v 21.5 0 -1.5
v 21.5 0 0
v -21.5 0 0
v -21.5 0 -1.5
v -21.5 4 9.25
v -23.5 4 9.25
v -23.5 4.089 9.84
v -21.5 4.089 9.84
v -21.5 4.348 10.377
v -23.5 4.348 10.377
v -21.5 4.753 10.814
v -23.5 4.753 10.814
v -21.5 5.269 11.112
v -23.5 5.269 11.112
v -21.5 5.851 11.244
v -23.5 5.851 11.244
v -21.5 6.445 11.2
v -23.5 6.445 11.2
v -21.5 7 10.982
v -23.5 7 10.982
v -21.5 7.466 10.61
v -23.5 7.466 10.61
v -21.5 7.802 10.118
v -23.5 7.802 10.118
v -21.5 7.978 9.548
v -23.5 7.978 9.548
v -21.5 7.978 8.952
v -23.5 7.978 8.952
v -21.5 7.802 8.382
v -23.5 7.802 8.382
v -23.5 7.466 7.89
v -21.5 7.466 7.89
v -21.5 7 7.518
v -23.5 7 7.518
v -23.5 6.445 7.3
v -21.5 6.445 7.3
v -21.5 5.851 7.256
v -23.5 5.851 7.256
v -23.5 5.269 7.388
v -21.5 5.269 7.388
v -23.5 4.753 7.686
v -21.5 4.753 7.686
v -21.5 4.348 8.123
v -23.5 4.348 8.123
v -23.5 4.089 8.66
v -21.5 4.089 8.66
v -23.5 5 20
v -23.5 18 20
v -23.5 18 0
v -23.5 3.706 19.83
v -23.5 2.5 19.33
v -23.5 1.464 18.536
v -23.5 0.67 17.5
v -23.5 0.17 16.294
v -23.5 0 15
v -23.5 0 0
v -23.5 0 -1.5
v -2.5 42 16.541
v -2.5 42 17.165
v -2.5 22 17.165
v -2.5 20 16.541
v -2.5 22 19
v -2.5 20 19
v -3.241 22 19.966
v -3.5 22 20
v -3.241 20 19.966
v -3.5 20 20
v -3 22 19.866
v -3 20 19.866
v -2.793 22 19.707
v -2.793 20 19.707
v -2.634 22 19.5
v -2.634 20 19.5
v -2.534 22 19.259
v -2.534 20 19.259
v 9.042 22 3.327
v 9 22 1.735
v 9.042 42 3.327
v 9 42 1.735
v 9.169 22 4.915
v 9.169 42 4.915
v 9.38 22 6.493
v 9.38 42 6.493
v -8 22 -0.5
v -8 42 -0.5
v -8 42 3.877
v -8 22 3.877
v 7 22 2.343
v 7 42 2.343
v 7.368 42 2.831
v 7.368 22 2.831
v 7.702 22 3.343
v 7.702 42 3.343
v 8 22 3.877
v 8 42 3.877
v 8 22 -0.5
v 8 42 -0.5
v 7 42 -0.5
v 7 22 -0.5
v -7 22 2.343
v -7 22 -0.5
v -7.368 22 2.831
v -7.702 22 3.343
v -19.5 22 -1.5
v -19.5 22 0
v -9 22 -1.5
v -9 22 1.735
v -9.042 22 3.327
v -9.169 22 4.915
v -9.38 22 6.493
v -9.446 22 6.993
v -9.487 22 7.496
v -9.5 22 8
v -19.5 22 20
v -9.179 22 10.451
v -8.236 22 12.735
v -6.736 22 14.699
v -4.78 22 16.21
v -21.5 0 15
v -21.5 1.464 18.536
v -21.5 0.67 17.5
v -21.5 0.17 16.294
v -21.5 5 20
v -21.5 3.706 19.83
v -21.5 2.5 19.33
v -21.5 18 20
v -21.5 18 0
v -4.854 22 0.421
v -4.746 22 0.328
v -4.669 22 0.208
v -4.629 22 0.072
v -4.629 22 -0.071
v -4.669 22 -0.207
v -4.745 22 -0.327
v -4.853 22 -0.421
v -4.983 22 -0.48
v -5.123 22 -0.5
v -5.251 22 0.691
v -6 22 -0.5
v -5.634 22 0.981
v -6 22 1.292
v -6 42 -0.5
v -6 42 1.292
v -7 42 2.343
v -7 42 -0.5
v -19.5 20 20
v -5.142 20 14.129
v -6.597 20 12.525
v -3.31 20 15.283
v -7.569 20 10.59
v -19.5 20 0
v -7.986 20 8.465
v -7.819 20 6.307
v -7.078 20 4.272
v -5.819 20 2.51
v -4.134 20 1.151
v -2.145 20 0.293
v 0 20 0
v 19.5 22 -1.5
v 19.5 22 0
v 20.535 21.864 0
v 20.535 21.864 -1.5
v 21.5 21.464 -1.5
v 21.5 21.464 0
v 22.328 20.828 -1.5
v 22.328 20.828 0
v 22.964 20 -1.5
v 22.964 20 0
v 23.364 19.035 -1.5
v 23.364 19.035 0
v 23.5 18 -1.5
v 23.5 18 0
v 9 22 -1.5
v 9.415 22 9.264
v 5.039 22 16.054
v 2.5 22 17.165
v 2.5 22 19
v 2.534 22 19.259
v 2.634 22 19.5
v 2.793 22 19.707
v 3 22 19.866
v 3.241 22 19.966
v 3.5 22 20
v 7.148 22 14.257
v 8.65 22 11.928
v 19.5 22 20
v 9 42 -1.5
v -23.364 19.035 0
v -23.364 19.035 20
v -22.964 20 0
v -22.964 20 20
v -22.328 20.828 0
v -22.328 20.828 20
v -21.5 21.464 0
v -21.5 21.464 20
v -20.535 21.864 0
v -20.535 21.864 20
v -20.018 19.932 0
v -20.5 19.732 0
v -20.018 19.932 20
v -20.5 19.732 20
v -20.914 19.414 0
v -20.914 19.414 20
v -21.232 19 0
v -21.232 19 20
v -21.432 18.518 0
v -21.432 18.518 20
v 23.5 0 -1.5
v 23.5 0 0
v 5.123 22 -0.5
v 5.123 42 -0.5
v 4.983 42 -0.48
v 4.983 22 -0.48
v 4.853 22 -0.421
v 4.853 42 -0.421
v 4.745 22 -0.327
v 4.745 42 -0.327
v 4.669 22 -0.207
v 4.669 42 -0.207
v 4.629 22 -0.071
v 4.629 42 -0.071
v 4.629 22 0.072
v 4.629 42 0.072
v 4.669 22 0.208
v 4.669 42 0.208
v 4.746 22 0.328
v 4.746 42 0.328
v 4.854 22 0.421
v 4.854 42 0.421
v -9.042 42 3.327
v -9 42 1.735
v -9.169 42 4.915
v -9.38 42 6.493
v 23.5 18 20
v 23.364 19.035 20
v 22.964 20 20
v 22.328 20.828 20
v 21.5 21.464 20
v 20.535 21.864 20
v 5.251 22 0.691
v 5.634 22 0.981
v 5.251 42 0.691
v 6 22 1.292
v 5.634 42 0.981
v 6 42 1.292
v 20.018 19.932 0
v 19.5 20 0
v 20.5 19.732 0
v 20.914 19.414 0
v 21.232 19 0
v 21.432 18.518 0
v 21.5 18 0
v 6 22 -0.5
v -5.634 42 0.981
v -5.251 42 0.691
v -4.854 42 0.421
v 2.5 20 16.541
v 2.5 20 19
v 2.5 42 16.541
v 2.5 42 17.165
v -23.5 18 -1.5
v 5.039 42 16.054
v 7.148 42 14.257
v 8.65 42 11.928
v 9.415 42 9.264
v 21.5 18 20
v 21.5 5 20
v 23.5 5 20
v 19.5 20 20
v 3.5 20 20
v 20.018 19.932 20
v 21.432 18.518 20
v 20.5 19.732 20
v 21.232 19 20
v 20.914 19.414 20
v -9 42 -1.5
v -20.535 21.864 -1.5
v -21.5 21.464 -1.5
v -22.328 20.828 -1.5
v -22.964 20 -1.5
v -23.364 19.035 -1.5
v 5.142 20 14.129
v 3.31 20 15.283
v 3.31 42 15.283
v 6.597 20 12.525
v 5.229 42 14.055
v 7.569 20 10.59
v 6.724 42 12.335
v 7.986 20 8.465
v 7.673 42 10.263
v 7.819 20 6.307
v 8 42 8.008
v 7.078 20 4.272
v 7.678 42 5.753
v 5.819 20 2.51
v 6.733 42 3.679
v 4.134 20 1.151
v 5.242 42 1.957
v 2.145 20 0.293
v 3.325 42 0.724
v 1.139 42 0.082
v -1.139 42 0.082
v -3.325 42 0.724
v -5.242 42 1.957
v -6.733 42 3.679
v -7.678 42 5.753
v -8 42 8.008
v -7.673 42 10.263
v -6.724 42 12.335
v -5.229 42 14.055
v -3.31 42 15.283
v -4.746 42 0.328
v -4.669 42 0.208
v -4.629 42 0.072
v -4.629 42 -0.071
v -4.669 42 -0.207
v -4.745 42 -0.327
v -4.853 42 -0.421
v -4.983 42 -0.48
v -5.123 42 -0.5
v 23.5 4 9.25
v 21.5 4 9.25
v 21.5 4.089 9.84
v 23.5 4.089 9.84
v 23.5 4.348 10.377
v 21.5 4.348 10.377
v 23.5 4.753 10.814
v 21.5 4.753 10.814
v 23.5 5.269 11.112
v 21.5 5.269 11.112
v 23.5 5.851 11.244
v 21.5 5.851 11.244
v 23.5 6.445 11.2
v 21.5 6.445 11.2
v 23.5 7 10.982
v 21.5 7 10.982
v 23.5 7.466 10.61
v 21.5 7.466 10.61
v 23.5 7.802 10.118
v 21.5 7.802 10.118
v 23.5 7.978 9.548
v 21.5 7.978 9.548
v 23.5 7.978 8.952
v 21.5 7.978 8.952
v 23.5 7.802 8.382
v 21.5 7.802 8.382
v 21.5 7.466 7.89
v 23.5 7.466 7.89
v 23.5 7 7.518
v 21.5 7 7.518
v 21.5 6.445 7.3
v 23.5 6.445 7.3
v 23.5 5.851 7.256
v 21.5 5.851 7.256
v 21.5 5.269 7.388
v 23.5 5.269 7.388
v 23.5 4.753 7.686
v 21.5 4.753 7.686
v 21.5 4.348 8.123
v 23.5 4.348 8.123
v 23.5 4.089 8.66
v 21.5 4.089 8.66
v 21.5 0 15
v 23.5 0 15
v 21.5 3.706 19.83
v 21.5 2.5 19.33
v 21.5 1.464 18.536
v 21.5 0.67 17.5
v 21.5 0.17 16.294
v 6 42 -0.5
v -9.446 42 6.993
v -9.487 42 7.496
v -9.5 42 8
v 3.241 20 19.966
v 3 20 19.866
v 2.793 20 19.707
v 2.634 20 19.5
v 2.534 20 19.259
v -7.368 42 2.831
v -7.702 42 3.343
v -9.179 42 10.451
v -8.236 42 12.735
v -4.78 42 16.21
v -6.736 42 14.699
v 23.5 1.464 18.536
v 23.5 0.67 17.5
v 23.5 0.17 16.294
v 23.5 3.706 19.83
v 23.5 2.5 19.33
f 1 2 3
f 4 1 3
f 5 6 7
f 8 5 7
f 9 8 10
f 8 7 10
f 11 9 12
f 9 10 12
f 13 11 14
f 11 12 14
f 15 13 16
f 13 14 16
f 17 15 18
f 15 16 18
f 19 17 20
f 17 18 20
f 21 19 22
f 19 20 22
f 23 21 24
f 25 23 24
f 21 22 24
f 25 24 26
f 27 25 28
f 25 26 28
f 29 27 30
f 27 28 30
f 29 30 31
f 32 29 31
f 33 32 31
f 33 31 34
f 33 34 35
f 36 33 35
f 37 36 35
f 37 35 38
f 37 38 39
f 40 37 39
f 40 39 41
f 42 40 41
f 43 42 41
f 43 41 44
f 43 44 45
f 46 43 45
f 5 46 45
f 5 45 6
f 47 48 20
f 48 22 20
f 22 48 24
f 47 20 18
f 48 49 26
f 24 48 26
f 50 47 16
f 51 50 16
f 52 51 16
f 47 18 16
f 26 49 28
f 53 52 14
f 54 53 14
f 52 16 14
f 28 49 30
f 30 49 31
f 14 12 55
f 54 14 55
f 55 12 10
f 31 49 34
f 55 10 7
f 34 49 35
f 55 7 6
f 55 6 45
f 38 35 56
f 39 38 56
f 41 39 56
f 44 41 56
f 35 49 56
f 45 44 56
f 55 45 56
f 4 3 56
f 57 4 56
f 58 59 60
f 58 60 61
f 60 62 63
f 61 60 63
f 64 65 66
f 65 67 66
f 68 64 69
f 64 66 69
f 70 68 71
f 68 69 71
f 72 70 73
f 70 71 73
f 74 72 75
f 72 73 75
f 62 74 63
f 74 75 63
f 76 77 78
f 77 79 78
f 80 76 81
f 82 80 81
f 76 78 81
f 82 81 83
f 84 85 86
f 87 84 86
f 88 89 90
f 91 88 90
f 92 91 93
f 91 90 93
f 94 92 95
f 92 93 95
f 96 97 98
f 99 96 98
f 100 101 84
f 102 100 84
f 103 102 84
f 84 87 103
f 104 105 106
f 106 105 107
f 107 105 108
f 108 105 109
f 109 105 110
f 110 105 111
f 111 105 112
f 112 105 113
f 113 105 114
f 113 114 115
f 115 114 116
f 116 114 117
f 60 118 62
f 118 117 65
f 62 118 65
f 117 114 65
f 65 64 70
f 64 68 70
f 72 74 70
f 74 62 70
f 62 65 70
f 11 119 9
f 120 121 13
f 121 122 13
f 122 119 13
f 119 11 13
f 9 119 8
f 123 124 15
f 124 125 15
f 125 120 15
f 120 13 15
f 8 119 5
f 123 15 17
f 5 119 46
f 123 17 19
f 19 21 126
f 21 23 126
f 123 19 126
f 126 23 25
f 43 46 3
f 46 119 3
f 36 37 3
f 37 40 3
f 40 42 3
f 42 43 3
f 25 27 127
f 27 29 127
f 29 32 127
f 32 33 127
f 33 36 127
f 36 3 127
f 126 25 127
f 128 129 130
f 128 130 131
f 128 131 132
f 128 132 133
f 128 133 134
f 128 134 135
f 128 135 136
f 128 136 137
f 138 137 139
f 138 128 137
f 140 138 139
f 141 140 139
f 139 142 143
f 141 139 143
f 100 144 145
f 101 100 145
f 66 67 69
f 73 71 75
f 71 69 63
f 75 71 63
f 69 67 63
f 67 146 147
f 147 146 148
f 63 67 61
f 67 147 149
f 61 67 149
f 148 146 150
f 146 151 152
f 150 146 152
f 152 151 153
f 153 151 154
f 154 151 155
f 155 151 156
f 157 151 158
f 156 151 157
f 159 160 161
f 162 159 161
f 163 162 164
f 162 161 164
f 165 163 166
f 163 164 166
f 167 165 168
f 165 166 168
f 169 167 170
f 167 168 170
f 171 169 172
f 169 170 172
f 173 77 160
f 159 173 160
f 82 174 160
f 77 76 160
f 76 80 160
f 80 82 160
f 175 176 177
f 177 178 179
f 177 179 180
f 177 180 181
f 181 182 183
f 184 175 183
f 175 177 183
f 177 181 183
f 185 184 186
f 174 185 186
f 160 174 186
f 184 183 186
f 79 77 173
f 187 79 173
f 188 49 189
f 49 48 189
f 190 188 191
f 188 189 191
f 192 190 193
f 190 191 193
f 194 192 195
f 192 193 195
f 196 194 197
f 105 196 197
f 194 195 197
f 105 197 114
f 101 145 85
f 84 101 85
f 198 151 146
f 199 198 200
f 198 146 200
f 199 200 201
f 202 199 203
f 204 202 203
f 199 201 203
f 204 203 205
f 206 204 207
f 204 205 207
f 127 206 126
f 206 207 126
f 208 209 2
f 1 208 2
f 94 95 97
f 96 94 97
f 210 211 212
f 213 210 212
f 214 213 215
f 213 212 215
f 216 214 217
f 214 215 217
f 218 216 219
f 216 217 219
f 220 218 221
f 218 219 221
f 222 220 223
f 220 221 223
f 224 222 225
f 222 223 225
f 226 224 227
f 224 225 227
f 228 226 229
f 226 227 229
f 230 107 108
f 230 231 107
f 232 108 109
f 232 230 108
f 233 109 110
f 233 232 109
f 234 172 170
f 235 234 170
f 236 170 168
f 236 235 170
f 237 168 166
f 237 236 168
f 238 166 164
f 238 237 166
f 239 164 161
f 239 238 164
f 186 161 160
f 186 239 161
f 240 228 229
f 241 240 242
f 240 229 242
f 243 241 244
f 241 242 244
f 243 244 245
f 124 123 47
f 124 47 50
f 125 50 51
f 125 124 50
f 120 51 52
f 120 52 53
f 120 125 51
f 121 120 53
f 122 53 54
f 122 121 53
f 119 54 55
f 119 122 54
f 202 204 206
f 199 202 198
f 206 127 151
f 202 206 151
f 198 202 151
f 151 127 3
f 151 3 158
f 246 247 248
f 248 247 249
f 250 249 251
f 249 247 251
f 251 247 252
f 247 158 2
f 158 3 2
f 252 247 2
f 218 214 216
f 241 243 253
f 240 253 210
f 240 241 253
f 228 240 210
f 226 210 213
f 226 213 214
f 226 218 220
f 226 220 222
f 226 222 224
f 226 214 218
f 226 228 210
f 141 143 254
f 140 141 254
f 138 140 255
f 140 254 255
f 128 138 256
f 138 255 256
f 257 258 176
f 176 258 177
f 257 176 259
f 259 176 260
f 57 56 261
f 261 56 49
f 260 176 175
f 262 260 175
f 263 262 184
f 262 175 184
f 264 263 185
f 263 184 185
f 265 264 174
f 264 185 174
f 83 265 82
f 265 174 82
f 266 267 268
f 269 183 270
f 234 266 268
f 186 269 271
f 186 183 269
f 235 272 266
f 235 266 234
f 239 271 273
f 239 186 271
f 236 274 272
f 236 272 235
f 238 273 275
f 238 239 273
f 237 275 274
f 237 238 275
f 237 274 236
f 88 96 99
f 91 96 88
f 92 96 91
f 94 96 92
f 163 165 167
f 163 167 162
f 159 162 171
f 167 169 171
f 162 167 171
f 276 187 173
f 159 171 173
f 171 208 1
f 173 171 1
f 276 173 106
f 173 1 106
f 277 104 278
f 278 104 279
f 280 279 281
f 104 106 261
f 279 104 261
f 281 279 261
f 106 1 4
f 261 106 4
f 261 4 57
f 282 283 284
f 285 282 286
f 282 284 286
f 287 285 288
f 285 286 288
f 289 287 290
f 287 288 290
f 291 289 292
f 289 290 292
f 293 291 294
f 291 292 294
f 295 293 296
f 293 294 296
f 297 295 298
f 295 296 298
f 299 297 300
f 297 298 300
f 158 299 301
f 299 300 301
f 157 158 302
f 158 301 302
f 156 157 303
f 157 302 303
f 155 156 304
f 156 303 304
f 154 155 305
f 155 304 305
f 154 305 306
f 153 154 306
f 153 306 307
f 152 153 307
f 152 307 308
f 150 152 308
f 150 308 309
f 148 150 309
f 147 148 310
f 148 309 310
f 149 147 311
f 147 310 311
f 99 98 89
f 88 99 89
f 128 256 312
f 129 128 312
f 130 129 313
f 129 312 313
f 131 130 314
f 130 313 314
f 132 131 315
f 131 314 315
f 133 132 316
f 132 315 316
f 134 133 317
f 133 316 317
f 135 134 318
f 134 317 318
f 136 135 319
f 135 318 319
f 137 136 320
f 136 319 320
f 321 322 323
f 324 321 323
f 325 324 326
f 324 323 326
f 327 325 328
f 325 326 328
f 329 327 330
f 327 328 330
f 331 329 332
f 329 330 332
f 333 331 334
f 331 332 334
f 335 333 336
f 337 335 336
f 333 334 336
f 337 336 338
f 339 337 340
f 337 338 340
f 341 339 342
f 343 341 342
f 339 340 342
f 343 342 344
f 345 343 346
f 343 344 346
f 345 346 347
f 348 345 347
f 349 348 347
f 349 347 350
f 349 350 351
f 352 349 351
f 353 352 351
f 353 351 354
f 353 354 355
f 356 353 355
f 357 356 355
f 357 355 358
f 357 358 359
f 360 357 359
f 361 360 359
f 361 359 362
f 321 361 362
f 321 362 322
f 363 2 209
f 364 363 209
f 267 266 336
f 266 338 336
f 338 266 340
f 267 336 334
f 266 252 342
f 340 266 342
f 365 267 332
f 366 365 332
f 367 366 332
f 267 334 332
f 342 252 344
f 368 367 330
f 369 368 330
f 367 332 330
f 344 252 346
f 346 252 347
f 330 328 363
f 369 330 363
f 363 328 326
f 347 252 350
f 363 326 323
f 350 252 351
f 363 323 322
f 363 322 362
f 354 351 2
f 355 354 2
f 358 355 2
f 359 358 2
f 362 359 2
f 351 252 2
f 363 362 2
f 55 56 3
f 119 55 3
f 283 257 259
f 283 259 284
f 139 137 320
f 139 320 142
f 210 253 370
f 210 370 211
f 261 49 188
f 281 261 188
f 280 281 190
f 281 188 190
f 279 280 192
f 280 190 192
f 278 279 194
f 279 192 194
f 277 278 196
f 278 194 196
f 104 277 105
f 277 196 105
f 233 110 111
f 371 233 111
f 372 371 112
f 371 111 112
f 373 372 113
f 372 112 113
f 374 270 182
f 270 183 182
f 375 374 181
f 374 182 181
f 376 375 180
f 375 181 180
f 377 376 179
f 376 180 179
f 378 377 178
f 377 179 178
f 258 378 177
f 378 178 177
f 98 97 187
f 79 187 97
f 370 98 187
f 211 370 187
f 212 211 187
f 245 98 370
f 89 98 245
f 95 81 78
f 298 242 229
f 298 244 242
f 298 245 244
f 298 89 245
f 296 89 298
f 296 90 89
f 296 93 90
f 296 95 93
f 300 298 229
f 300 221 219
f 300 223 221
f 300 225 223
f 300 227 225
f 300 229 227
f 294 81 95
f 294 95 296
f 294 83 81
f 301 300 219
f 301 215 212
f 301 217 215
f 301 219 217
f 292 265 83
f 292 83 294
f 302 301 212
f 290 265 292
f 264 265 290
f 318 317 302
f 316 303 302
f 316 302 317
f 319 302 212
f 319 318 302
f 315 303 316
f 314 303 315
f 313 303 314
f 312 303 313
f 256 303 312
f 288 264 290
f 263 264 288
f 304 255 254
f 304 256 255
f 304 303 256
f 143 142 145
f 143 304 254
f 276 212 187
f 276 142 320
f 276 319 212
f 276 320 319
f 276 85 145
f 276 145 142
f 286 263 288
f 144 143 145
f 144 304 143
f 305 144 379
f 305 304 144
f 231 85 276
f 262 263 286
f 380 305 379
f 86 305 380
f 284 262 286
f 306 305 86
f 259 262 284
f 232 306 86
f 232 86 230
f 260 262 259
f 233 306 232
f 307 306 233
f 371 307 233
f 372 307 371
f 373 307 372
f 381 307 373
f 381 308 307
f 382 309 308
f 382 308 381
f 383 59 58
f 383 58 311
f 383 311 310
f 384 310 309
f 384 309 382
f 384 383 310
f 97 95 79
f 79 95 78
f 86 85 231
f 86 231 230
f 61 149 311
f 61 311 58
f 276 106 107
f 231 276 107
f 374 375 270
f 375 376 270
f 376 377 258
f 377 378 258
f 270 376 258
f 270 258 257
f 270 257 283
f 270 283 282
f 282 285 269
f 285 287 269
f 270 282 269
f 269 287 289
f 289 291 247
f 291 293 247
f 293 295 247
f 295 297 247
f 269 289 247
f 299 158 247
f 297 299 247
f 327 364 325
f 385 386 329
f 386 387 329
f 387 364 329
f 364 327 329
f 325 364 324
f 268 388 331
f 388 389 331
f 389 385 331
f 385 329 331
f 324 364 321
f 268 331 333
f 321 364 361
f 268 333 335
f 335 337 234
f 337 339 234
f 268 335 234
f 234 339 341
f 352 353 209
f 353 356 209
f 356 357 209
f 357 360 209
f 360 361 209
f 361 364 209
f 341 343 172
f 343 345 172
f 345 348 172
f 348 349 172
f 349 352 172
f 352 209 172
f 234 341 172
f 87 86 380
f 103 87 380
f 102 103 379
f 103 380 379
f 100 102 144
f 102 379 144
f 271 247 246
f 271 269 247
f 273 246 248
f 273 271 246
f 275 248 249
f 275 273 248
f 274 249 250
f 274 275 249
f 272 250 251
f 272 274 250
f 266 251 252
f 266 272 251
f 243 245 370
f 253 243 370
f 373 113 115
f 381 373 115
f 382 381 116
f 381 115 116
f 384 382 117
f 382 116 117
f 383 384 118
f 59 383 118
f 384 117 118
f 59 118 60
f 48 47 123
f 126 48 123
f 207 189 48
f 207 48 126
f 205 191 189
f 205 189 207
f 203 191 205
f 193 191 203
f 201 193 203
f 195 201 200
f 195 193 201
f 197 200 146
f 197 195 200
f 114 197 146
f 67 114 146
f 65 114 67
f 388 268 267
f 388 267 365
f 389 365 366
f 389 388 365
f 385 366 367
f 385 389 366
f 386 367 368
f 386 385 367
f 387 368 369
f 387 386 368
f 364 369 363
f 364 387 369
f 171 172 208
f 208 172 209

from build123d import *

# Parameters (mm, degrees)
F1_DEPTH     = 20
F2_R         = 2
F3_R         = 4
F5_DEPTH     = 1.5
F6_R         = 8
F7_DEPTH     = 20
F8_DEPTH     = 25
F9_W         = 5
F9_H         = 35.9879870677
F9_H_2       = 3.0384219572
F9_H_3       = 2
F10_DEPTH    = 12.4
F11_T1_DEPTH = 26.8776444438
F12_R        = 1
F13_R        = 5
F15_DEPTH    = 20
F17_DEPTH    = 20
F18_R        = 30
F19_R        = 2
F20_DEPTH    = 58


# Not quite as in the source:
# - a fillet or chamfer that OpenCascade refuses, or shapes differently, is made with other operations: its cross-section is extruded or revolved along the edge and cut away or added
# - ends of sketch curves that miss each other by under 0.0002 mm in the source are joined


with BuildPart() as f1:
    # F0 (on Top) → F1 (new body)
    with BuildSketch(Plane.XY):
        Polygon((-21.4999990134, 20), (21.5000009866, 20), (21.5, 0), (23.5, 0), (23.5000010853, 22), (-23.4999989147, 22), (-23.5, 0), (-21.5, 0), align=None)
    extrude(amount=F1_DEPTH)

    # F2
    f2_edges = [f1.edges().sort_by_distance(p)[0] for p in [
        (-21.499999, 20, 10),
        (21.500001, 20, 10),
    ]]
    fillet(f2_edges, radius=F2_R)

    # F3
    f3_edges = [f1.edges().sort_by_distance(p)[0] for p in [
        (-23.499999, 22, 10),
        (23.500001, 22, 10),
    ]]
    fillet(f3_edges, radius=F3_R)

    # F4 (on face) → F5 (join)
    with BuildSketch(Plane(origin=(0, 0, 0), x_dir=(1, 0, 0), z_dir=(0, 0, -1))):
        with BuildLine():
            Line((21.500000888, -17.9999999013), (21.5, 0))
            Line((21.5, 0), (-21.5, -2.2199e-06))
            Line((-21.5, -2.2199e-06), (-21.499999112, -18.0000000987))
            ThreePointArc((-21.499999112, -18.0000000987), (-20.9142126395, -19.4142135973), (-19.499999112, -20))
            Line((-19.499999112, -20), (19.500000888, -20))
            ThreePointArc((19.500000888, -20), (20.9142144852, -19.4142135275), (21.500000888, -17.9999999013))
        make_face()
        with BuildLine():
            ThreePointArc((19.500000888, -22), (22.3284280825, -20.828427055), (23.500000888, -17.9999998027))
            Line((23.500000888, -17.9999998027), (23.5, 0))
            Line((23.5, 0), (21.5, -9.87e-08))
            Line((21.5, -9.87e-08), (21.500000888, -17.9999999013))
            ThreePointArc((21.500000888, -17.9999999013), (20.9142144852, -19.4142135275), (19.500000888, -20))
            Line((19.500000888, -20), (-19.499999112, -20))
            ThreePointArc((-19.499999112, -20), (-20.9142126395, -19.4142135973), (-21.499999112, -18.0000000987))
            Line((-21.499999112, -18.0000000987), (-21.5, 0))
            Line((-21.5, 0), (-23.5, -2.3186e-06))
            Line((-23.5, -2.3186e-06), (-23.499999112, -18.0000001973))
            ThreePointArc((-23.499999112, -18.0000001973), (-22.328426167, -20.8284271945), (-19.499999112, -22))
            Line((-19.499999112, -22), (19.500000888, -22))
        make_face()
    extrude(amount=F5_DEPTH)

    # F6 (on face) → F7 (join)
    with BuildSketch(Plane(origin=(0, 22, 0), x_dir=(-1, 0, 0), z_dir=(0, 1, 0))):
        with BuildLine():
            ThreePointArc((4.21e-08, -1.5), (6.7175144362, 1.2824855936), (9.5, 8))
            ThreePointArc((9.5, 8), (-6.7175144362, 14.7175144064), (4.21e-08, -1.5))
        make_face()
        with Locations((0, 8)):
            Circle(F6_R, mode=Mode.SUBTRACT)
    extrude(amount=F7_DEPTH)

    # F8 (cut): a face of the model
    f8_faces = [f1.faces().sort_by_distance(p)[0] for p in [
        (0, 22, 8),
    ]]
    extrude(f8_faces, amount=-F8_DEPTH, mode=Mode.SUBTRACT)

    # F9 (on face) → F10 (cut)
    with BuildSketch(Plane.XY.offset(20)):
        with Locations((0, 39.9939935338)):
            Rectangle(F9_W, F9_H)
        with Locations((0, 18.4807890214)):
            Rectangle(F9_W, F9_H_2)
        with Locations((0, 21)):
            Rectangle(F9_W, F9_H_3)
    extrude(amount=-F10_DEPTH, mode=Mode.SUBTRACT)

    # F11: chamfer of 1 on 2 edges, made by hand

    # F11_s2 → F11_t1 (cut)
    with BuildSketch(Plane.XZ.offset(-44.4388222219)):
        with BuildLine():
            Line((-3.3316740869, 15.2494859065), (-2.4783436331, 16.5746305544))
            Line((-2.4783436331, 16.5746305544), (-2.4583436331, 16.5746305544))
            ThreePointArc((-2.4583436331, 16.5746305544), (-2.48, 16.0869863156), (-2.48, 15.5993420768))
            Line((-2.48, 15.5993420768), (-2.49375, 15.5803437216))
            ThreePointArc((-2.49375, 15.5803437216), (-2.9171284808, 15.4277022979), (-3.3233990426, 15.2312781158))
            Line((-3.3233990426, 15.2312781158), (-3.3316740869, 15.2494859065))
        make_face()
        with BuildLine():
            Line((2.4783436331, 16.5746305544), (3.3316740869, 15.2494859065))
            Line((3.3316740869, 15.2494859065), (3.3233990426, 15.2312781158))
            ThreePointArc((3.3233990426, 15.2312781158), (2.9171284808, 15.4277022979), (2.49375, 15.5803437216))
            Line((2.49375, 15.5803437216), (2.48, 15.5993420768))
            ThreePointArc((2.48, 15.5993420768), (2.48, 16.0869863156), (2.4583436331, 16.5746305544))
            Line((2.4583436331, 16.5746305544), (2.4783436331, 16.5746305544))
        make_face()
    extrude(amount=F11_T1_DEPTH, mode=Mode.SUBTRACT)

    # F12
    f12_edges = [f1.edges().sort_by_distance(p)[0] for p in [
        (2.5, 21, 20),
        (-2.5, 21, 20),
    ]]
    fillet(f12_edges, radius=F12_R)

    # F13
    f13_edges = [f1.edges().sort_by_distance(p)[0] for p in [
        (-22.5, 0, 20),
        (22.5, 0, 20),
    ]]
    fillet(f13_edges, radius=F13_R)

    # F14 (on face) → F15 (join)
    with BuildSketch(Plane(origin=(0, 22, 0), x_dir=(-1, 0, 0), z_dir=(0, 1, 0))):
        with BuildLine():
            ThreePointArc((2.1e-08, -1.5), (-5.5388120473, 0.2817384662), (-9, 4.9586187349))
            Line((-9, 4.9586187349), (-9, -1.5))
            Line((-9, -1.5), (0, -1.5))
        make_face()
        with BuildLine():
            ThreePointArc((9, 4.9586187349), (5.5388120644, 0.2817384785), (2.1e-08, -1.5))
            Line((0, -1.5), (9, -1.5))
            Line((9, -1.5), (9, 4.9586187349))
        make_face()
    extrude(amount=F15_DEPTH)

    # F16 (on face) → F17 (cut)
    with BuildSketch(Plane(origin=(0, 42, 0), x_dir=(-1, 0, 0), z_dir=(0, 1, 0))):
        with BuildLine():
            ThreePointArc((-7, 2.3431457505), (-7.53910447, 3.0845240526), (-8, 3.8768943744))
            Line((-8, 3.8768943744), (-8, -0.5))
            Line((-8, -0.5), (-7, -0.5))
            Line((-7, -0.5), (-7, 2.3431457505))
        make_face()
        with BuildLine():
            Line((8, -0.5), (8, 3.8768943744))
            ThreePointArc((8, 3.8768943744), (7.53910447, 3.0845240526), (7, 2.3431457505))
            Line((7, 2.3431457505), (7, -0.5))
            Line((7, -0.5), (8, -0.5))
        make_face()
        with BuildLine():
            ThreePointArc((-4.8538187839, 0.4210526316), (-5.4443451471, 0.8334732318), (-6, 1.2917960675))
            Line((-6, 1.2917960675), (-6, -0.5))
            Line((-6, -0.5), (-5.123475383, -0.5))
            ThreePointArc((-5.123475383, -0.5), (-4.643617948, -0.1404878717), (-4.8538187839, 0.4210526316))
        make_face()
        with BuildLine():
            Line((6, -0.5), (6, 1.2917960675))
            ThreePointArc((6, 1.2917960675), (5.4443451471, 0.8334732318), (4.8538187839, 0.4210526316))
            ThreePointArc((4.8538187839, 0.4210526316), (4.643617948, -0.1404878717), (5.123475383, -0.5))
            Line((5.123475383, -0.5), (6, -0.5))
        make_face()
    extrude(amount=-F17_DEPTH, mode=Mode.SUBTRACT)

    # F18
    f18_edges = [f1.edges().sort_by_distance(p)[0] for p in [
        (-9, 32, 4.958619),
        (9, 32, 4.958619),
    ]]
    fillet(f18_edges, radius=F18_R)

    # F19 (on face) → F20 (cut)
    with BuildSketch(Plane(origin=(-23.5, 1.1593e-06, 0), x_dir=(-4.93e-08, -1, 0), z_dir=(-1, 4.93e-08, 0))):
        with Locations((-5.999999038, 9.25)):
            Circle(F19_R)
    extrude(amount=-F20_DEPTH, mode=Mode.SUBTRACT)


solid = f1.part
